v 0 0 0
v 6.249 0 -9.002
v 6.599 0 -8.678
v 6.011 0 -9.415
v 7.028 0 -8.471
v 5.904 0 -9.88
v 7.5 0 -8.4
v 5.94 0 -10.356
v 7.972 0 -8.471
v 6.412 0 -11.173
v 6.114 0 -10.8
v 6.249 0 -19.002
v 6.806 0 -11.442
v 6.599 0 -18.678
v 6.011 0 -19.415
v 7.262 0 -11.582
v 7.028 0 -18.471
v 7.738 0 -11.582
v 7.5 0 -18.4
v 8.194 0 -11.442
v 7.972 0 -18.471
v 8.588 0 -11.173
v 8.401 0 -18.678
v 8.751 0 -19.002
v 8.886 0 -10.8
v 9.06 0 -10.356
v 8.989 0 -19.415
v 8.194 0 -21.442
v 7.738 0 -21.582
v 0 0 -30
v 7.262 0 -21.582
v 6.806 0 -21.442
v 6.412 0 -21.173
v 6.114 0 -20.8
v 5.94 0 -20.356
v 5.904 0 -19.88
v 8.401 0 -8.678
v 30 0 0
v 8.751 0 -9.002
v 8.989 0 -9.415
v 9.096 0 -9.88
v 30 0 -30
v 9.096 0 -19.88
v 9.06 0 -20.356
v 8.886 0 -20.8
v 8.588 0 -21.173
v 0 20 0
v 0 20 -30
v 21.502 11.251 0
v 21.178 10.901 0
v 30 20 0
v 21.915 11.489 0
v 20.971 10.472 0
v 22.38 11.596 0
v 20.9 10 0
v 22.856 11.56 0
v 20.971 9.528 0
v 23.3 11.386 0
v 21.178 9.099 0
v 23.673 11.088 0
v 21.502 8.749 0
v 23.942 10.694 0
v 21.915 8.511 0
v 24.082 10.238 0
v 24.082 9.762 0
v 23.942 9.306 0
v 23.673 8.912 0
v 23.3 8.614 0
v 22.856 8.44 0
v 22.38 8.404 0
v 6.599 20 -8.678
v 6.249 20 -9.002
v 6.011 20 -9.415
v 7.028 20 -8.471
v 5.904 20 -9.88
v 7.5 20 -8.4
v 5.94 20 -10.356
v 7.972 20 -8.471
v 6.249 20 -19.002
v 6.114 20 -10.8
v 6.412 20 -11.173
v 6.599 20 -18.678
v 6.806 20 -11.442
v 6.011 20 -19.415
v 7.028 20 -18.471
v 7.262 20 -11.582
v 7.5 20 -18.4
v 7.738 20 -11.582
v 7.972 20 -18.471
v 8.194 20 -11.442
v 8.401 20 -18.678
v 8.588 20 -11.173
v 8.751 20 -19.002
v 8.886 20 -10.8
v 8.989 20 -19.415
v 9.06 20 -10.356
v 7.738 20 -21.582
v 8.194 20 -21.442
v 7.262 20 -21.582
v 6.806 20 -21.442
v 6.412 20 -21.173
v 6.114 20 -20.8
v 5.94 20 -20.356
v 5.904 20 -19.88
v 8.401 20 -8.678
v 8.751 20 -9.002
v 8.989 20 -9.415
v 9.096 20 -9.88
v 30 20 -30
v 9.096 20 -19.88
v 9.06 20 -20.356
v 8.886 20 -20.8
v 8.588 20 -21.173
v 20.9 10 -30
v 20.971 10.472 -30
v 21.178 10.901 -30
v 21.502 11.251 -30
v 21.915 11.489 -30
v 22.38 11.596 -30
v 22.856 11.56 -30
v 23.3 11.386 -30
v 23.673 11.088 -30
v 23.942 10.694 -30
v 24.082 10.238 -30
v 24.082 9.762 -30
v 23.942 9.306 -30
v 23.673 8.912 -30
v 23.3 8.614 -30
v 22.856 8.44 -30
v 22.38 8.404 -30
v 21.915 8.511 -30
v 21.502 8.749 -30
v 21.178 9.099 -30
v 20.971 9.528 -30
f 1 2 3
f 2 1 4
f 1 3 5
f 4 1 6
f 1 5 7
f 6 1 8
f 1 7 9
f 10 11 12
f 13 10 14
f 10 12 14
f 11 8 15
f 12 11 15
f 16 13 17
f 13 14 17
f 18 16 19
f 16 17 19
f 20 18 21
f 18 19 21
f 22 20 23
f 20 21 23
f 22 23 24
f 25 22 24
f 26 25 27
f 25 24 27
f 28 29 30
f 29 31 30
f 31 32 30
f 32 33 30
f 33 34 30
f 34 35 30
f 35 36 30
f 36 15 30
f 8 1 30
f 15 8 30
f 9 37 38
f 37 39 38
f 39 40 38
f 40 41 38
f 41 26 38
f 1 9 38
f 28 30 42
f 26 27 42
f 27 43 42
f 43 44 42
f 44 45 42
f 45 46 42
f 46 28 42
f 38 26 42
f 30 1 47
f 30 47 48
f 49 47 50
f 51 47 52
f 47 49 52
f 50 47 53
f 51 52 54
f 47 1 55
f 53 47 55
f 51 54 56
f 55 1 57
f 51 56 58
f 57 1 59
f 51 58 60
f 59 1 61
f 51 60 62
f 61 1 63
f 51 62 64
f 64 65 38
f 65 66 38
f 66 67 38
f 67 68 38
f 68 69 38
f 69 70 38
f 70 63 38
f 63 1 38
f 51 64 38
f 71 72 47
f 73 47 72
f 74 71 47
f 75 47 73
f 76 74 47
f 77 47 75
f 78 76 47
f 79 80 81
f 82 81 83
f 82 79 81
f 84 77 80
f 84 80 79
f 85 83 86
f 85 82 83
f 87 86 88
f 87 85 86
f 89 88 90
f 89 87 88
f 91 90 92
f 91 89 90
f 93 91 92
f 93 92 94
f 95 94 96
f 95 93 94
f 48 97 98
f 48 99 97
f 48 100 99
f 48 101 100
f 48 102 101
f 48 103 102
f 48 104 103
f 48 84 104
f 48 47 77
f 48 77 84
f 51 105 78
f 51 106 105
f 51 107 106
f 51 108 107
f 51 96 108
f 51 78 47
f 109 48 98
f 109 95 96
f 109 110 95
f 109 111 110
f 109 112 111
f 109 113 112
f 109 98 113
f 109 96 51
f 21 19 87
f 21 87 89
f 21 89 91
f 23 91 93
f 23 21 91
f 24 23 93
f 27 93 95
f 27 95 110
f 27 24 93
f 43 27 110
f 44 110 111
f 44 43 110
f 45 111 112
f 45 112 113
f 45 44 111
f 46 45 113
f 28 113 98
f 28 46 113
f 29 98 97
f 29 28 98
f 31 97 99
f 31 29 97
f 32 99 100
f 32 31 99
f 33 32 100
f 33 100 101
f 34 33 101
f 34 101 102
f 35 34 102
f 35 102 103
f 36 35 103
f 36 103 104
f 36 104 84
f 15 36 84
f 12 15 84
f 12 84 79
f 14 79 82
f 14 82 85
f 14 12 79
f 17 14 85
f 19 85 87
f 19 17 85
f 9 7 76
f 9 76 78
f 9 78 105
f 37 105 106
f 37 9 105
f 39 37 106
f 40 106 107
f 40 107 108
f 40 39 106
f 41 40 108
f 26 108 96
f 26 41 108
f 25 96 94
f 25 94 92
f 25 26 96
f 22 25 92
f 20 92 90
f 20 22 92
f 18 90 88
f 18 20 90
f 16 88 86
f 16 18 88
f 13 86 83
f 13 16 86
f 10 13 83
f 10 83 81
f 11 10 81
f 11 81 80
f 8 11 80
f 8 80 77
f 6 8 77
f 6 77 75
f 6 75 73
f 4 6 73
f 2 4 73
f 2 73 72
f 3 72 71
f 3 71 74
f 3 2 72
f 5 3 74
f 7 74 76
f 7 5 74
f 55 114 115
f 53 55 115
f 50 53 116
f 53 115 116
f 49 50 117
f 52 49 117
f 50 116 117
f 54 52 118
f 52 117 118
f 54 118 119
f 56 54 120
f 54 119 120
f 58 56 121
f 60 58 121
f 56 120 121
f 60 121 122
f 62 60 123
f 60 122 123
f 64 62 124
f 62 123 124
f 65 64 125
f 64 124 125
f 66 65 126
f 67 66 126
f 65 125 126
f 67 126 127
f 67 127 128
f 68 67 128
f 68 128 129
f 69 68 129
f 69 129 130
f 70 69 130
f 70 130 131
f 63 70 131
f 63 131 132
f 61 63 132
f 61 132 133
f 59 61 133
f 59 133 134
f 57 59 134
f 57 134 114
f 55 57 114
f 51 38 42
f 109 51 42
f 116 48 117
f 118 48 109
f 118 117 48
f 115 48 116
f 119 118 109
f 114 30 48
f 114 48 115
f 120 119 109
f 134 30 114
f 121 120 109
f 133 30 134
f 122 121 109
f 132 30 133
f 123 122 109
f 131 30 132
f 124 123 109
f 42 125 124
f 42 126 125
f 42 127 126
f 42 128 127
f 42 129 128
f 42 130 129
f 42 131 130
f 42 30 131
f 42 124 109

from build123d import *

# Parameters (mm, degrees)
SKETCH_1_W          = 30
SKETCH_1_H          = 30
SKETCH_1_R          = 1.6
EXTRUDE_1_DEPTH     = 20
SKETCH_2_R          = 1.6
CUT_EXTRUDE_1_DEPTH = 47.904157598


with BuildPart() as part:
    # 草图1 → 凸台-拉伸1 (new body)
    with BuildSketch(Plane(origin=(0, 0, 0), x_dir=(1, 0, 0), z_dir=(0, 1, 0))):
        with Locations((15, 15)):
            Rectangle(SKETCH_1_W, SKETCH_1_H)
        with Locations(Location((7.5, 20, 0), (0, 0, 270))):
            Circle(SKETCH_1_R, mode=Mode.SUBTRACT)
        with Locations(Location((7.5, 10, 0), (0, 0, 270))):
            Circle(SKETCH_1_R, mode=Mode.SUBTRACT)
    extrude(amount=EXTRUDE_1_DEPTH)

    # 草图2 → 切除-拉伸1 (cut, through all)
    with BuildSketch(Plane(origin=(0, 0, -30), x_dir=(-1, 0, 0), z_dir=(0, 0, -1))):
        with Locations((-22.5, 10)):
            Circle(SKETCH_2_R)
    extrude(amount=-CUT_EXTRUDE_1_DEPTH, mode=Mode.SUBTRACT)


solid = part.part
